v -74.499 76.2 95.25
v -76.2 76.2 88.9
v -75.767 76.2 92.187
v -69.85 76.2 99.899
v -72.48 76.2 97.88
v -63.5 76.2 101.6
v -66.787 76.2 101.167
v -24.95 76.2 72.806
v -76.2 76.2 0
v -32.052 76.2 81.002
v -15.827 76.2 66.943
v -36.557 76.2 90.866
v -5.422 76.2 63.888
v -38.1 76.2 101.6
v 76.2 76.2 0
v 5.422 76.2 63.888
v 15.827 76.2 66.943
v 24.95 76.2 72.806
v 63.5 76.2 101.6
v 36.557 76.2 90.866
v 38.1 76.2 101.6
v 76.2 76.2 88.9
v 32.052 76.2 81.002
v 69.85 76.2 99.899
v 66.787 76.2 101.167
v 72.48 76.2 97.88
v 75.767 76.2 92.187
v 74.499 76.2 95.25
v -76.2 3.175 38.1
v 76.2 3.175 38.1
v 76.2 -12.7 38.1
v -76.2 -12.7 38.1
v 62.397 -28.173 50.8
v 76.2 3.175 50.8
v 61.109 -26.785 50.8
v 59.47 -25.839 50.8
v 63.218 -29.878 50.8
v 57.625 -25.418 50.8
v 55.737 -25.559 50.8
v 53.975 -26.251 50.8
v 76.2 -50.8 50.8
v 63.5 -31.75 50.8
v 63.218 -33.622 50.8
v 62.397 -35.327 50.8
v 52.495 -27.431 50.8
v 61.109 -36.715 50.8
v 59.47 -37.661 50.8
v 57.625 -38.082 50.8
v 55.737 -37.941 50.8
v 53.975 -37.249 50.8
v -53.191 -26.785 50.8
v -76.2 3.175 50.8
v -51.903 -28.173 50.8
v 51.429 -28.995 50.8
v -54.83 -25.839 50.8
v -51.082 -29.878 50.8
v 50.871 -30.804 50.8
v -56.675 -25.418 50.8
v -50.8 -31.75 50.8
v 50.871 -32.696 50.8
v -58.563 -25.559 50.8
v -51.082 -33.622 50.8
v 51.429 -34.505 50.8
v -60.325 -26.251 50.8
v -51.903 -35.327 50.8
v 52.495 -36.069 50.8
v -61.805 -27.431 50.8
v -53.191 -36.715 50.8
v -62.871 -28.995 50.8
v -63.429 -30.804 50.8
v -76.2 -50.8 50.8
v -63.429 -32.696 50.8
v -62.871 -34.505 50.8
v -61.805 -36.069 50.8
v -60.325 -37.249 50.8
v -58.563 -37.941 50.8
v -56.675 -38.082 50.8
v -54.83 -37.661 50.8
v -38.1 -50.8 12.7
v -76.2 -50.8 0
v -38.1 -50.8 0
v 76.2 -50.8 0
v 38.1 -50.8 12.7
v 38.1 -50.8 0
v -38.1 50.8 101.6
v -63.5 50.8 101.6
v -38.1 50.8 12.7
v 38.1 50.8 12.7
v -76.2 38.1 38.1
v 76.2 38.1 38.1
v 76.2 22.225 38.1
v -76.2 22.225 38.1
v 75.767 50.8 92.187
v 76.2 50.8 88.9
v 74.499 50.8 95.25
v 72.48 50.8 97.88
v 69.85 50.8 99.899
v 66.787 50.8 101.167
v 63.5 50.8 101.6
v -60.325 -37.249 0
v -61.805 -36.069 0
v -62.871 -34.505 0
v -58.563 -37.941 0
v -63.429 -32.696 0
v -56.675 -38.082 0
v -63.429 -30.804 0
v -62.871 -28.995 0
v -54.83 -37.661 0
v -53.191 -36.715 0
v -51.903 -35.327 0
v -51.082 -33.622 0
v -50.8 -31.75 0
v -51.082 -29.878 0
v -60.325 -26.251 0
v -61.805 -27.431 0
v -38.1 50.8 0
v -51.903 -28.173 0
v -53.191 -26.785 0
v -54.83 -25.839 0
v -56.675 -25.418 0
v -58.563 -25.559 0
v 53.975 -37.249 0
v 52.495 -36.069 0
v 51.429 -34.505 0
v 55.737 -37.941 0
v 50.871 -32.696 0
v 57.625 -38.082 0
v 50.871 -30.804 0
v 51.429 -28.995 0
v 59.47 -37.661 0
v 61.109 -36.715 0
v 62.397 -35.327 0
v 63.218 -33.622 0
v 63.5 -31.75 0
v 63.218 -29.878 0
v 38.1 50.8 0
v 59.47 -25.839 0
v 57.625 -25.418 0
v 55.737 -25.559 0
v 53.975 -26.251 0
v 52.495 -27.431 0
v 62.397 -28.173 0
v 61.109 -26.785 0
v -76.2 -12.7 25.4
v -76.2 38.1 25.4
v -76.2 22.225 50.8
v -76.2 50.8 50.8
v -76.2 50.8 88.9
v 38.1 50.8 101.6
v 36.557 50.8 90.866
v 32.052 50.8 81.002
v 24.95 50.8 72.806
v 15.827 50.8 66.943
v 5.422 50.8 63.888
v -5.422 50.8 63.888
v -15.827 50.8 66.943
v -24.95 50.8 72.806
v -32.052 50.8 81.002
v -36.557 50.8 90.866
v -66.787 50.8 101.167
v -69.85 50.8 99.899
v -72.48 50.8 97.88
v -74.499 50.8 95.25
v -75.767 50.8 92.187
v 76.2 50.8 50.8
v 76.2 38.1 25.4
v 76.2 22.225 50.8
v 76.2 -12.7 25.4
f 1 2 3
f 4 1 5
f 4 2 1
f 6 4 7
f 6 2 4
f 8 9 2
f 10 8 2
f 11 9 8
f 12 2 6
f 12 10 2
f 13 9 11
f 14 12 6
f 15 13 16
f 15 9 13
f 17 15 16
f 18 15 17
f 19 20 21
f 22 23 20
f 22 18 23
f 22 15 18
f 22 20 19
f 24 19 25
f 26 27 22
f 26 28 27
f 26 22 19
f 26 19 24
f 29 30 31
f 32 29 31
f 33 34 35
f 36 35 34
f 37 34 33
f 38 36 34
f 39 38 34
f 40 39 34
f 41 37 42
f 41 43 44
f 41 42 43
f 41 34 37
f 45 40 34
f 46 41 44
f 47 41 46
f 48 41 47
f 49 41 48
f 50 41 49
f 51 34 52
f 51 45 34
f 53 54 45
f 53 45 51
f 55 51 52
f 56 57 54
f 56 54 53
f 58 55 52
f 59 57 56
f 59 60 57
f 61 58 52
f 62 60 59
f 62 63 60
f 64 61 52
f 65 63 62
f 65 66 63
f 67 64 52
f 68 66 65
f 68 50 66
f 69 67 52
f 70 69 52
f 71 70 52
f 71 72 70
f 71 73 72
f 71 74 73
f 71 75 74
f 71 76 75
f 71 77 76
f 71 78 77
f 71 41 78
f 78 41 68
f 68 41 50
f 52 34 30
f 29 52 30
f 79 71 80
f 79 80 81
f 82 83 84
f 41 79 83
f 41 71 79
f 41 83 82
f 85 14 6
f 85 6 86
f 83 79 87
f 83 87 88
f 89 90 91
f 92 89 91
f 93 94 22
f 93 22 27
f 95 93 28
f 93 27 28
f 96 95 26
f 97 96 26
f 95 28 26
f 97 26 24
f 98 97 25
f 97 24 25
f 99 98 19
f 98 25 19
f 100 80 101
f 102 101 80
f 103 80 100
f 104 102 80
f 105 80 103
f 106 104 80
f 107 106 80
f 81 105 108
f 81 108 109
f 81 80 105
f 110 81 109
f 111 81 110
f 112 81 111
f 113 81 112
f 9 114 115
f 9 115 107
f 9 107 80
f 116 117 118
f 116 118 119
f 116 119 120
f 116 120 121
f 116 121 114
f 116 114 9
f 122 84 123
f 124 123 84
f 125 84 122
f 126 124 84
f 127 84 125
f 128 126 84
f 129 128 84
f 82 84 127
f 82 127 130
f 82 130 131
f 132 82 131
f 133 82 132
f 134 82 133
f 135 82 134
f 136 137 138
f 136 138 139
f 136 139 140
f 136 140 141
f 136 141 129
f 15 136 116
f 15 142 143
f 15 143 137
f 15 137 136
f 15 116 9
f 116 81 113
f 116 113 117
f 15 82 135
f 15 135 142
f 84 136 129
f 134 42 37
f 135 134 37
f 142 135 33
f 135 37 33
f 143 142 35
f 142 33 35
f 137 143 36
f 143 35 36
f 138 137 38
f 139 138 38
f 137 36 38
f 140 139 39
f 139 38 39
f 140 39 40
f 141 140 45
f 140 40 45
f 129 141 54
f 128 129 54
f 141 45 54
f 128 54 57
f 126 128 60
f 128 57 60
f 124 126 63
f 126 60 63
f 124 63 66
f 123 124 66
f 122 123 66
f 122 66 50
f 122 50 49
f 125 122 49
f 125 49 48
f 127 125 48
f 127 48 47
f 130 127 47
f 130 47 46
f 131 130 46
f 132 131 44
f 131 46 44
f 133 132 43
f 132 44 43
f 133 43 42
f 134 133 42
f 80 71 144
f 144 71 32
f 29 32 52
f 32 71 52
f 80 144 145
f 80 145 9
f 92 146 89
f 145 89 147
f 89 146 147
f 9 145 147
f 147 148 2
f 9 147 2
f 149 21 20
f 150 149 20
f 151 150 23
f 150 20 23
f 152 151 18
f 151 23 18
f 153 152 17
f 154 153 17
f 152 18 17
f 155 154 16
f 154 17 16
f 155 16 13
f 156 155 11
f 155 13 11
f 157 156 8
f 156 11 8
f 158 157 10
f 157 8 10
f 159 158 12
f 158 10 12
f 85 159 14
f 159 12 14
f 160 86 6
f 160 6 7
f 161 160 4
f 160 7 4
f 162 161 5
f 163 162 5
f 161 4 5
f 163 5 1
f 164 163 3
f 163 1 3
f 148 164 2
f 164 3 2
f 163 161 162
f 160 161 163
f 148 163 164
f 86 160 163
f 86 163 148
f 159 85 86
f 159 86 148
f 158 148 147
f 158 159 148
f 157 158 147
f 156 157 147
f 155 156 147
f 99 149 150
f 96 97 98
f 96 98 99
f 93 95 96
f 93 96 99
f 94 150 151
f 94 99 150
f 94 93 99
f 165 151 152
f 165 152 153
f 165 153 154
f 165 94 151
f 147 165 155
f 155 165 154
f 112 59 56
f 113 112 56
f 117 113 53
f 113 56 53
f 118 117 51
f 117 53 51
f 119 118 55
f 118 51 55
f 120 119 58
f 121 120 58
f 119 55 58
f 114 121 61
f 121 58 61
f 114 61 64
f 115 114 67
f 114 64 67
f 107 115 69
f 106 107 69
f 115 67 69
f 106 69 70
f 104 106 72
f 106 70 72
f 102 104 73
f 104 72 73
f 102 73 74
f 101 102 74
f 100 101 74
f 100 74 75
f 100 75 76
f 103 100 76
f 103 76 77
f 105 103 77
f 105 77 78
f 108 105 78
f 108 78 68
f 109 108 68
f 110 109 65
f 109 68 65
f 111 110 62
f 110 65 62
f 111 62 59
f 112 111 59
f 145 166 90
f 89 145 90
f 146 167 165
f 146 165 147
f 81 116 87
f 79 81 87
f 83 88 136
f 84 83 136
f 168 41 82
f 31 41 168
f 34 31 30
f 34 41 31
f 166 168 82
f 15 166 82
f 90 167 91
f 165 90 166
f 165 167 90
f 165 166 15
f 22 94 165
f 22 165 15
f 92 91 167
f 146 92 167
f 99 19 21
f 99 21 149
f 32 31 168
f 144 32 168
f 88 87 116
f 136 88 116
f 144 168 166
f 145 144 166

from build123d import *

# Parameters (mm, degrees)
F1_DEPTH  = 50.8
F2_R      = 6.35
F3_DEPTH  = 50.8
F5_DEPTH  = 152.4
F7_DEPTH  = 152.4
F9_DEPTH  = 25.4
F11_DEPTH = 25.4
F13_DEPTH = 25.4


with BuildPart() as f1:
    # F0 (on Front) → F1 (new body, symmetric)
    with BuildSketch(Plane.XZ):
        Polygon((-76.2, 50.8), (-76.2, 0), (-38.1, 0), (-38.1, 12.7), (0, 12.7), (38.1, 12.7), (38.1, 0), (76.2, 0), (76.2, 50.8), align=None)
    extrude(amount=F1_DEPTH, both=True)

    # F2 (on face) → F3 (cut)
    with BuildSketch(Plane.XY.offset(50.8)):
        with Locations((-57.15, -31.75)):
            Circle(F2_R)
        with Locations((57.15, -31.75)):
            Circle(F2_R)
    extrude(amount=-F3_DEPTH, mode=Mode.SUBTRACT)

    # F4 (on face) → F5 (cut)
    with BuildSketch(Plane.YZ.offset(76.2)):
        Polygon((-12.7, 38.1), (-12.7, 25.4), (38.1, 25.4), (38.1, 38.1), (22.225, 38.1), (22.225, 50.8), (3.175, 50.8), (3.175, 38.1), align=None)
    extrude(amount=-F5_DEPTH, mode=Mode.SUBTRACT)

    # F6 (on face) → F7 (join)
    with BuildSketch(Plane.YZ.offset(76.2)):
        Polygon((50.8, 101.6), (50.8, 50.8), (50.8, 0), (76.2, 0), (76.2, 101.6), align=None)
    extrude(amount=-F7_DEPTH)

    # F8 (on face) → F9 (cut)
    with BuildSketch(Plane(origin=(0, 76.2, 0), x_dir=(-1, 0, 0), z_dir=(0, 1, 0))):
        with BuildLine():
            Line((38.1, 101.6), (-38.1, 101.6))
            ThreePointArc((-38.1, 101.6), (0, 63.5), (38.1, 101.6))
        make_face()
    extrude(amount=-F9_DEPTH, mode=Mode.SUBTRACT)

    # F10 (on face) → F11 (cut)
    with BuildSketch(Plane(origin=(0, 76.2, 0), x_dir=(-1, 0, 0), z_dir=(0, 1, 0))):
        with BuildLine():
            ThreePointArc((63.5, 101.6), (72.480256, 97.880256), (76.2, 88.9))
            Line((76.2, 88.9), (76.2, 101.6))
            Line((76.2, 101.6), (63.5, 101.6))
        make_face()
    extrude(amount=-F11_DEPTH, mode=Mode.SUBTRACT)

    # F12 (on face) → F13 (cut)
    with BuildSketch(Plane(origin=(0, 76.2, 0), x_dir=(-1, 0, 0), z_dir=(0, 1, 0))):
        with BuildLine():
            ThreePointArc((-76.2, 88.9), (-72.480256, 97.880256), (-63.5, 101.6))
            Line((-63.5, 101.6), (-76.2, 101.6))
            Line((-76.2, 101.6), (-76.2, 88.9))
        make_face()
    extrude(amount=-F13_DEPTH, mode=Mode.SUBTRACT)


solid = f1.part
